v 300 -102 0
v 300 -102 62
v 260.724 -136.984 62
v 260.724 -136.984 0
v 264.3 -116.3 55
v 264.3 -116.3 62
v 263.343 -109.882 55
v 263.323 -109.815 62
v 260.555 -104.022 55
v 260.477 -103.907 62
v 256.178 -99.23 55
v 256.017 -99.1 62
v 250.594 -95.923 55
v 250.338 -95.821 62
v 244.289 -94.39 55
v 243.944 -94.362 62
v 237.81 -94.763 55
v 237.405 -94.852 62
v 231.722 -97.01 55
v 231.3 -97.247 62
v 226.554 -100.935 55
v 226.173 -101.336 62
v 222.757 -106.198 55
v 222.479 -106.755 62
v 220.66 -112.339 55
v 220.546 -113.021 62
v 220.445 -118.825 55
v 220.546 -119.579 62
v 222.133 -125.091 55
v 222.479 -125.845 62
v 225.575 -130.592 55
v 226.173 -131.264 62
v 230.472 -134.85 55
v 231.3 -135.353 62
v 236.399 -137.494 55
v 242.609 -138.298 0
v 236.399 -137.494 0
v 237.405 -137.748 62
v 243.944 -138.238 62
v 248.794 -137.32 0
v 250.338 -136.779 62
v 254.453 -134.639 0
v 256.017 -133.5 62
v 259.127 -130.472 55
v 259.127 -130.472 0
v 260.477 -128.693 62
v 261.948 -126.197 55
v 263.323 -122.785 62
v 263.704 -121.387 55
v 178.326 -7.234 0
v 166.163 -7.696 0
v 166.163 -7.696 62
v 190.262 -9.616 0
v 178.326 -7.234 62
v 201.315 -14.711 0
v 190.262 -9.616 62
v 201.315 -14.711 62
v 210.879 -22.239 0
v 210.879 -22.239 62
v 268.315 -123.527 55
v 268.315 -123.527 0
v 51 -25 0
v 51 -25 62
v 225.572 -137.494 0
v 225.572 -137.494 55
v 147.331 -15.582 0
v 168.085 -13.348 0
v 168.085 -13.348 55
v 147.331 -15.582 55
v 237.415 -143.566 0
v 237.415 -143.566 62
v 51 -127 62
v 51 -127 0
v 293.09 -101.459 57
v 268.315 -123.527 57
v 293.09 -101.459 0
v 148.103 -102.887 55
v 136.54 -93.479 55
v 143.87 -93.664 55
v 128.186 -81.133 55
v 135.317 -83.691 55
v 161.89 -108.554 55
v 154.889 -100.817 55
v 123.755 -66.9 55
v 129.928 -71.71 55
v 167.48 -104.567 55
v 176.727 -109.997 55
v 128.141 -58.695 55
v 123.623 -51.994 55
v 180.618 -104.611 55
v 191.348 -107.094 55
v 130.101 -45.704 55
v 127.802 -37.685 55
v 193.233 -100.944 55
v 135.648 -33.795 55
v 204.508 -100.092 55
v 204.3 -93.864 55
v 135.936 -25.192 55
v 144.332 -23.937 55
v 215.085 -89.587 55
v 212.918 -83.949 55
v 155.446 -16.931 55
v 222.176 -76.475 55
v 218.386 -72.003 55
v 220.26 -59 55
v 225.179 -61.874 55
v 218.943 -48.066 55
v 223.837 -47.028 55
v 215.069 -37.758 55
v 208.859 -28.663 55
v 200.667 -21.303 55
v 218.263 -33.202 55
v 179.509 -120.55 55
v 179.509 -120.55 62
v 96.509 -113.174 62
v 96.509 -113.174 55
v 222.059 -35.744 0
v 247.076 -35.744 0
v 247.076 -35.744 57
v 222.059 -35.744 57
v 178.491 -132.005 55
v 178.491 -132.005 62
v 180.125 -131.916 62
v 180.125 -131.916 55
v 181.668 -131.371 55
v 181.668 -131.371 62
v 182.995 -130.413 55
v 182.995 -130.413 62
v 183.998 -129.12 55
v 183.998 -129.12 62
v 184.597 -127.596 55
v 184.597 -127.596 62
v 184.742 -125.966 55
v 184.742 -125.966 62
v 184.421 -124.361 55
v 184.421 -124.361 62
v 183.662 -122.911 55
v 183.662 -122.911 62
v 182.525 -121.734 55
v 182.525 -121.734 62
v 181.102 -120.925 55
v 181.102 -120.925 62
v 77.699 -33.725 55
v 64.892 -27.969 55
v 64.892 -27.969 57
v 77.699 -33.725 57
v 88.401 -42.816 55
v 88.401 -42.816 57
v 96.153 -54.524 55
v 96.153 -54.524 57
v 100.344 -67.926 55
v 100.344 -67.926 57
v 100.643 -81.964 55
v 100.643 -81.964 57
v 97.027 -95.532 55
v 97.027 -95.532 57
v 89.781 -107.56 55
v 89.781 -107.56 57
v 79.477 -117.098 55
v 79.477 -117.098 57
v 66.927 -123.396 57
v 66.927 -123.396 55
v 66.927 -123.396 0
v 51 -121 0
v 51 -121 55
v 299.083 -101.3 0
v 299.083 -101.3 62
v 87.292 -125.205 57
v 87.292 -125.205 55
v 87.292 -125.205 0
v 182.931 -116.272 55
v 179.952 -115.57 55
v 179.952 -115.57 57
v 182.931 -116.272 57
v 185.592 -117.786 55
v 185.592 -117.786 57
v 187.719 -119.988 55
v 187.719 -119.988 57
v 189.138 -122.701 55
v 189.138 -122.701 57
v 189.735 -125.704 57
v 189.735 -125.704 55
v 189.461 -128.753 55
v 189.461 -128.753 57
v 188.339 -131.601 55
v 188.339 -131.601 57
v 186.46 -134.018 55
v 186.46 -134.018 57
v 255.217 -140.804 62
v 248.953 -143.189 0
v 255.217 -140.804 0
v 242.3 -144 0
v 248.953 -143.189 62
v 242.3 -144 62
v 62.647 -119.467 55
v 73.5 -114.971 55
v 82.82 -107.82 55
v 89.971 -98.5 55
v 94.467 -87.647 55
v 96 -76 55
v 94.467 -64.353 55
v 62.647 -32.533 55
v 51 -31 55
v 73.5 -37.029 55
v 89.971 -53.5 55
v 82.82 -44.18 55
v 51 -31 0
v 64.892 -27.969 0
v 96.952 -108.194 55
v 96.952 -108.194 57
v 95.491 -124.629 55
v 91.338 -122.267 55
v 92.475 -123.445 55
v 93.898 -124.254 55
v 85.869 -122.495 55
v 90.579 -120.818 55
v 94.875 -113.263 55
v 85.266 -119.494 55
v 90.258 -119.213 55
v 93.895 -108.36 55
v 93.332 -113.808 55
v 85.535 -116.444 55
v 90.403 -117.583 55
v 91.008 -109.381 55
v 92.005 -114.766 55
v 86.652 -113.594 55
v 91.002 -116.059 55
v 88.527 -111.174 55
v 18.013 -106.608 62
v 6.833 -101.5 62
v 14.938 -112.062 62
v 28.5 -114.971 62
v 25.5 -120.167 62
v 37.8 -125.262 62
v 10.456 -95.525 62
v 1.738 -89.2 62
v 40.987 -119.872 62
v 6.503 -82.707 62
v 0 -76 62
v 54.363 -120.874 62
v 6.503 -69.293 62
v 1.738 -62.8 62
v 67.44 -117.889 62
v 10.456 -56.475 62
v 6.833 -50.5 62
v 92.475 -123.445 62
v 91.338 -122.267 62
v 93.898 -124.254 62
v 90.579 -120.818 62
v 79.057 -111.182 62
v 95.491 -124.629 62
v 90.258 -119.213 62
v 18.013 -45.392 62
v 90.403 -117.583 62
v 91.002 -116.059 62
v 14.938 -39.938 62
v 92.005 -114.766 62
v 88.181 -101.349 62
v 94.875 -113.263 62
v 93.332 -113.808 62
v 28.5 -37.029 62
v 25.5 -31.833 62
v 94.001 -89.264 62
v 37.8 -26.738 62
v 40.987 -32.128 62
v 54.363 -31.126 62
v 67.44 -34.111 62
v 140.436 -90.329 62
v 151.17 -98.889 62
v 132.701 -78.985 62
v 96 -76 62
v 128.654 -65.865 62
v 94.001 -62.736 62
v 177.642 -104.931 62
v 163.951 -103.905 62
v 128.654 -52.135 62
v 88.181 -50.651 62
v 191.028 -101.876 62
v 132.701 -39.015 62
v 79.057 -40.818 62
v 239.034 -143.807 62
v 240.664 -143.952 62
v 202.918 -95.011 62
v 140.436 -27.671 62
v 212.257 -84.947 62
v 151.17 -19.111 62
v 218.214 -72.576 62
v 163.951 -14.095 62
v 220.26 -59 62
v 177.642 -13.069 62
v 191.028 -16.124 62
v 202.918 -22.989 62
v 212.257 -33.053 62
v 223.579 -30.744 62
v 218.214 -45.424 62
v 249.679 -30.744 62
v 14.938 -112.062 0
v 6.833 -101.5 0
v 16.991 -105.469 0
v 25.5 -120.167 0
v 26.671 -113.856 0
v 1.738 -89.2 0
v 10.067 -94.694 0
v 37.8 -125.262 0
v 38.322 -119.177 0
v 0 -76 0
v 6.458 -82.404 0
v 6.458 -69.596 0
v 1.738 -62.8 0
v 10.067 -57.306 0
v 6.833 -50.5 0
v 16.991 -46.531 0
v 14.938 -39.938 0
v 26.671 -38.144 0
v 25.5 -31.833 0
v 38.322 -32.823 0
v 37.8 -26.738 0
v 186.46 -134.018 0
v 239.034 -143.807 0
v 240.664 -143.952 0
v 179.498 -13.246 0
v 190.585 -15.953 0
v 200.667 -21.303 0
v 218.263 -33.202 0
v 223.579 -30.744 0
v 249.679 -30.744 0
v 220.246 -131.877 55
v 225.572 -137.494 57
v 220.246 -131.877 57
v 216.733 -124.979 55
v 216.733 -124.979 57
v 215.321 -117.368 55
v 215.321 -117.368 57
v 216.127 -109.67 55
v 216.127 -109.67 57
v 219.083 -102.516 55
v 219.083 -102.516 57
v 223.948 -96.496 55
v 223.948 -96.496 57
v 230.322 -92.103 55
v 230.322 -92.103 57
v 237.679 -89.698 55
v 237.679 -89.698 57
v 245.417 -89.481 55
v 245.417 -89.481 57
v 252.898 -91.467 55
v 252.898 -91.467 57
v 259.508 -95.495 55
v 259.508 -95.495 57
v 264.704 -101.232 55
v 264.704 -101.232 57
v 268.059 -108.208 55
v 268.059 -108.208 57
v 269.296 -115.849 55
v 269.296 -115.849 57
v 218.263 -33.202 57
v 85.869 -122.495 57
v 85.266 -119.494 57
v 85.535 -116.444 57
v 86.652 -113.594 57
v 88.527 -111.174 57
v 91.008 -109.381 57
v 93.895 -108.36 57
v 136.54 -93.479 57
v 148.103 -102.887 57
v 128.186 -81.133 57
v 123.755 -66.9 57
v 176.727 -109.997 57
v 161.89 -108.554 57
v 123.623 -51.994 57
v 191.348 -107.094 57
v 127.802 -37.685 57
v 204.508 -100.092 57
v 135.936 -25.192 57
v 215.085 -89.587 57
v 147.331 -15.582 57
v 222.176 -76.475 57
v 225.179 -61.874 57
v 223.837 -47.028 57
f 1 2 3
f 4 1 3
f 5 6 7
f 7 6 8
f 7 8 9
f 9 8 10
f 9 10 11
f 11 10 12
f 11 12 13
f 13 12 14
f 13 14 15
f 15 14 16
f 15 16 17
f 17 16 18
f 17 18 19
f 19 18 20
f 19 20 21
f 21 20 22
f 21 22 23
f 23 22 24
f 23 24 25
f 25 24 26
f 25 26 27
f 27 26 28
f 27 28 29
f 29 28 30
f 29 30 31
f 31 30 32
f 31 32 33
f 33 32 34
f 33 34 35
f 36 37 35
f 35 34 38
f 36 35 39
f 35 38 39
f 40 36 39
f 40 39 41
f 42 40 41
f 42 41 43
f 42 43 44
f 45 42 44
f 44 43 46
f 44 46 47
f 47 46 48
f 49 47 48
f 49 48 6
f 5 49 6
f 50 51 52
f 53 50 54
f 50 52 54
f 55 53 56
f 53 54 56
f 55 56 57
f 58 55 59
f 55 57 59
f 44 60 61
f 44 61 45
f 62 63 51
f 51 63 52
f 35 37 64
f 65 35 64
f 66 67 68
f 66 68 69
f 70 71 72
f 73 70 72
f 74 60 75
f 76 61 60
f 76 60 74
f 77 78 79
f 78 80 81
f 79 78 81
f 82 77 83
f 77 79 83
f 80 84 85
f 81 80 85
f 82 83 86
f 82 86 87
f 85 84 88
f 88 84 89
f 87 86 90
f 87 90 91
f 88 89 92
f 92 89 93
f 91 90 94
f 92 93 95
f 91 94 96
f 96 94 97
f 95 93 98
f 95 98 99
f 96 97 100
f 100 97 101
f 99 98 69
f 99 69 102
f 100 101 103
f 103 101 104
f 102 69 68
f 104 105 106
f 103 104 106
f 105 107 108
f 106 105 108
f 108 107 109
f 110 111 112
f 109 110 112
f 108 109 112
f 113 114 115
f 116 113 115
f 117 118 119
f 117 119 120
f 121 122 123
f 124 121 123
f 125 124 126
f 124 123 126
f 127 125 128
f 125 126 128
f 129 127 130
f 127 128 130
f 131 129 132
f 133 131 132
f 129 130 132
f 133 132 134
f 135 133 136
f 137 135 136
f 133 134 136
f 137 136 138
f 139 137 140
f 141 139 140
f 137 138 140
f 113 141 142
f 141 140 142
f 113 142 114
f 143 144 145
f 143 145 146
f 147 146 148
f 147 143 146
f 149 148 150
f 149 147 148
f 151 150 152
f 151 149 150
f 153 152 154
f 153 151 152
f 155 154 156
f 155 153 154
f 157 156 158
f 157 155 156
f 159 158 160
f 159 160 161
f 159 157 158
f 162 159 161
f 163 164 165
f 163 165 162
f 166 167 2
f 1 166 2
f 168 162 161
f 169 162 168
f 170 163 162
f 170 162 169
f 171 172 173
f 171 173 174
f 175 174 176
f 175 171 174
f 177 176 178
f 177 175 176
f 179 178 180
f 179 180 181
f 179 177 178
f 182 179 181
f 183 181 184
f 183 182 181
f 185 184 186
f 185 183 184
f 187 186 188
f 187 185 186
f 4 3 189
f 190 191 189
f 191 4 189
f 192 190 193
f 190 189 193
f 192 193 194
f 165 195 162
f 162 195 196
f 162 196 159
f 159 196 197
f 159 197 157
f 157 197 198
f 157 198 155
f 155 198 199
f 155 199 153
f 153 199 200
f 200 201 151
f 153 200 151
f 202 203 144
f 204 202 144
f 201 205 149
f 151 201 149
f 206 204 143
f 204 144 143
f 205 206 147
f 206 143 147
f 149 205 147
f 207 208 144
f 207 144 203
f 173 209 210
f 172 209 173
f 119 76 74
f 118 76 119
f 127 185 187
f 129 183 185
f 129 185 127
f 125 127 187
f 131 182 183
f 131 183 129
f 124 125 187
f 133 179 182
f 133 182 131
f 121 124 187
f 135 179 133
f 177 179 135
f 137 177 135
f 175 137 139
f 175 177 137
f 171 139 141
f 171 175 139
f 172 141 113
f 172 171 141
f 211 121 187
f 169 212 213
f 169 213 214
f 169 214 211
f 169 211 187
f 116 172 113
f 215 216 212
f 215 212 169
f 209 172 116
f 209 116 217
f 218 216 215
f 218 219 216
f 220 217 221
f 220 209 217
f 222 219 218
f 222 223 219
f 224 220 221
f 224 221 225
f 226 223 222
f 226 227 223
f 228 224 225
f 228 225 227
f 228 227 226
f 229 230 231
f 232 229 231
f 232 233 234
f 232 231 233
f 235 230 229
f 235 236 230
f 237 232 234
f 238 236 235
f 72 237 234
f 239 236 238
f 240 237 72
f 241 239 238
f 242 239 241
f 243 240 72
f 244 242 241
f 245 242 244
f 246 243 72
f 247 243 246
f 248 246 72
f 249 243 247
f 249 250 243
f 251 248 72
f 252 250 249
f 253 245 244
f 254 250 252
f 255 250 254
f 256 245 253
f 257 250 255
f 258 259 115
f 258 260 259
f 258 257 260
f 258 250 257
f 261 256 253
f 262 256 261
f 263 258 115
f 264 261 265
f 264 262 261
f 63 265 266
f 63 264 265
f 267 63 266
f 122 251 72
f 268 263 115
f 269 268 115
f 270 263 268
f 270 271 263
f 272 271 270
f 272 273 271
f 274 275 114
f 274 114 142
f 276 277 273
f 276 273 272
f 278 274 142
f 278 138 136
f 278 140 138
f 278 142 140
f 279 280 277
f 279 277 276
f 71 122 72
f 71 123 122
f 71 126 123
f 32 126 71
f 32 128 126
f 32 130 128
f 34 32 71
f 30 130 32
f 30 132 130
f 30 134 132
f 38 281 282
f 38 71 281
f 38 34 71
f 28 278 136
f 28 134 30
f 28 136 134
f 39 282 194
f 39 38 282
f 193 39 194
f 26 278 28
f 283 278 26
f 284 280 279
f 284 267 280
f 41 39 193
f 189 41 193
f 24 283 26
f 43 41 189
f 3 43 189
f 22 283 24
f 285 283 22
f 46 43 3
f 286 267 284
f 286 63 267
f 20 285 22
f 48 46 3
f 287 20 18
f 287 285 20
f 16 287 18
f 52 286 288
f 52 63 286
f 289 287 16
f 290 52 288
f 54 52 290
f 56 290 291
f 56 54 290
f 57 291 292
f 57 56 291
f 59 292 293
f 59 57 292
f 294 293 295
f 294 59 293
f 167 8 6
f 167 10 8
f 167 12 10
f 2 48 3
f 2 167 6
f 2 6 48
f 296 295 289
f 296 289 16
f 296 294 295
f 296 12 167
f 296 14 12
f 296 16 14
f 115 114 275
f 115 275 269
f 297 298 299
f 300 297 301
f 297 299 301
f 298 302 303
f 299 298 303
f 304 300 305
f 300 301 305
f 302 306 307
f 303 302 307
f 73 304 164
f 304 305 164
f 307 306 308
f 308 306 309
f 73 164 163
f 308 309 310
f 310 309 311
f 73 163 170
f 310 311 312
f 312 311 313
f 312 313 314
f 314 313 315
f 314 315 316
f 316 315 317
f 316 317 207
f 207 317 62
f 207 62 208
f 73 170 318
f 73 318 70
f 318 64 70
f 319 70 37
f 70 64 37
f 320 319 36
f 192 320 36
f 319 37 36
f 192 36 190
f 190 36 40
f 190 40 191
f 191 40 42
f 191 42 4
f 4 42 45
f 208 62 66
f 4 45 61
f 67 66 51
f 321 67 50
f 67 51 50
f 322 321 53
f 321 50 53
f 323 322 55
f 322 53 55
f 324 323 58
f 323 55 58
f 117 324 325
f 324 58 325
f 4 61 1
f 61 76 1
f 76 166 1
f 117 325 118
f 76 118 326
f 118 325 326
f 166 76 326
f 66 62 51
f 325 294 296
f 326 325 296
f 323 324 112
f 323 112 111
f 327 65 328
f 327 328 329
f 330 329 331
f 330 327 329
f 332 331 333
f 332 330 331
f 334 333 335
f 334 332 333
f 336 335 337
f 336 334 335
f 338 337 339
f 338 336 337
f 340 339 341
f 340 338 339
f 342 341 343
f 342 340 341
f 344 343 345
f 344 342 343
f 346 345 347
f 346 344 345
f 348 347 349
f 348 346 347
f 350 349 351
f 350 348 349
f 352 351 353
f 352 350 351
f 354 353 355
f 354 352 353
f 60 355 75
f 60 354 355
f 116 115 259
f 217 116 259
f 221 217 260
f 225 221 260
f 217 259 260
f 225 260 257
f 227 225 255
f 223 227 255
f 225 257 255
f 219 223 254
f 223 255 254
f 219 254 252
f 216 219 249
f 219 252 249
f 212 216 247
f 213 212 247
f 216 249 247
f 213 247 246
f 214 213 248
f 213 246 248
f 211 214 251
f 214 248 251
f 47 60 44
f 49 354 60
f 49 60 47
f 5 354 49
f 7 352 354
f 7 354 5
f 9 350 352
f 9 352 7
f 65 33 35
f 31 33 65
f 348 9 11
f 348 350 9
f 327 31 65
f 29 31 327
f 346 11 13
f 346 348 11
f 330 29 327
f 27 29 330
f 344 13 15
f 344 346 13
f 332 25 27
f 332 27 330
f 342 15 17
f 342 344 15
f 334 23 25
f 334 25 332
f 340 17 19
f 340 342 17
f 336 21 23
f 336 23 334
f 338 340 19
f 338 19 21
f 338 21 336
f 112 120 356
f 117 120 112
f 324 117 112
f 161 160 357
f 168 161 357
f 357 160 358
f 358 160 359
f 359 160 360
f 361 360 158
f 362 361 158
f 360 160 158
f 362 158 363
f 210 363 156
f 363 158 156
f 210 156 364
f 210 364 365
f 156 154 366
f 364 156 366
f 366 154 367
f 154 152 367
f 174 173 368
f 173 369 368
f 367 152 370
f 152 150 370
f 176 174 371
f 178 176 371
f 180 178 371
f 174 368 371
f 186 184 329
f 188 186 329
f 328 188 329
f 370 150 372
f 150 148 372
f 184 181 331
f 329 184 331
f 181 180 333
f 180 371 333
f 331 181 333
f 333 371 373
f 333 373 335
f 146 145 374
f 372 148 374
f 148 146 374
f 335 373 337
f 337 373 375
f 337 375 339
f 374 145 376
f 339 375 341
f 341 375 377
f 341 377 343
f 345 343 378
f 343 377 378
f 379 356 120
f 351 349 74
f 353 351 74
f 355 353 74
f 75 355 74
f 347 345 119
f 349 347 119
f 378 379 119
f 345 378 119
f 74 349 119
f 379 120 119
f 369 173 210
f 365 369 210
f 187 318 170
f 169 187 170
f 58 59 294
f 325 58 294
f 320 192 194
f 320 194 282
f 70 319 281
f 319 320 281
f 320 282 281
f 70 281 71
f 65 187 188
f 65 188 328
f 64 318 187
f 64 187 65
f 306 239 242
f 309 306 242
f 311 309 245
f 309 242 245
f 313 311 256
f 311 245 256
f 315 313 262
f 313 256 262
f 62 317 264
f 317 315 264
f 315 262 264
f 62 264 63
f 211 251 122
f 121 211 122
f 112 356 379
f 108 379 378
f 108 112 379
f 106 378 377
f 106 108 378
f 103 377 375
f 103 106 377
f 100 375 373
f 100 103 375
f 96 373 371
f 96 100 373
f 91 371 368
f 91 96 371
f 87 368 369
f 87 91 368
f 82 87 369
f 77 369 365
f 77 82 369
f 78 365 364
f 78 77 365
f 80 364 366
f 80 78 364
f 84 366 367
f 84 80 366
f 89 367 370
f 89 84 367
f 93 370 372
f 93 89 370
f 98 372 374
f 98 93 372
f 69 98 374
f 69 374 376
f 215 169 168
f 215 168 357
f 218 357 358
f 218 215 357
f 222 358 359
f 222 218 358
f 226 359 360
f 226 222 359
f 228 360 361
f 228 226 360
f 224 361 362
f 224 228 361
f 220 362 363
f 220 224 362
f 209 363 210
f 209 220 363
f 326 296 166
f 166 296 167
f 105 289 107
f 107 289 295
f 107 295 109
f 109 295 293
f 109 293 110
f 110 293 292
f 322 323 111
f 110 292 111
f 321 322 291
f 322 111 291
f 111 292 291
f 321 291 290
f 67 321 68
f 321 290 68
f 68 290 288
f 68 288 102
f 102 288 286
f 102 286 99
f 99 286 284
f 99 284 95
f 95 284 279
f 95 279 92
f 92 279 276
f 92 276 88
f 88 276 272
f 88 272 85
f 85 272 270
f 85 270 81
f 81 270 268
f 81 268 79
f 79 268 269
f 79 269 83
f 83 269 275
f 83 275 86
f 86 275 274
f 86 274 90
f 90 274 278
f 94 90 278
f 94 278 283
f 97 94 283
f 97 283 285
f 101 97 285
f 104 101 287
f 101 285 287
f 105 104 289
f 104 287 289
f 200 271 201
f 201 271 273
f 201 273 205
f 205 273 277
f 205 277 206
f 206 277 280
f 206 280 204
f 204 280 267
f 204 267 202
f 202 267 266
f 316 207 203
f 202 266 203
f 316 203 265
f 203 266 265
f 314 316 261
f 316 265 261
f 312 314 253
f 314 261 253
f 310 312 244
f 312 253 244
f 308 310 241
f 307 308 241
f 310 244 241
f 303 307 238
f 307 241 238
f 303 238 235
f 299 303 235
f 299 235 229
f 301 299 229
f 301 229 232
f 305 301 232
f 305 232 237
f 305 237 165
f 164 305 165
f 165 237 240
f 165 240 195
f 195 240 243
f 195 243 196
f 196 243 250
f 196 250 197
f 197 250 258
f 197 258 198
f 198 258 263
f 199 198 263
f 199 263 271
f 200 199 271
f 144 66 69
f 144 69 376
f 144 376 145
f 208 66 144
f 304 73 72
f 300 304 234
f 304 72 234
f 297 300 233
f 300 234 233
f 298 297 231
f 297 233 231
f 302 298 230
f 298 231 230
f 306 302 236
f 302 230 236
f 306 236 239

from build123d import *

# Parameters (mm, degrees)
SKETCH1_W           = 300
SKETCH1_H           = 152
BOSS_EXTRUDE1_DEPTH = 62
CUT_EXTRUDE2_DEPTH  = 342.976607387
SKETCH7_R           = 45
SKETCH7_R_2         = 46.06
SKETCH7_R_3         = 22
CUT_EXTRUDE4_DEPTH  = 339.496676498
CUT_EXTRUDE6_DEPTH  = 339.496676498
CUT_EXTRUDE9_DEPTH  = 339.496676498
SHELL2_DEPTH        = 57
CUT_EXTRUDE10_DEPTH = 55


# Read off the part's stored shape, not the designer's step: Shell2
with BuildPart() as part:
    # Sketch1 → Boss-Extrude1 (new body)
    with BuildSketch(Plane.XY):
        with Locations((150, -76)):
            Rectangle(SKETCH1_W, SKETCH1_H)
    extrude(amount=BOSS_EXTRUDE1_DEPTH)

    # Sketch2 → Cut-Extrude2 (cut, through all)
    with BuildSketch(Plane.XY.offset(62)):
        with BuildLine():
            ThreePointArc((51, -127), (14.937554126, -112.062445807), (0, -75.999999905))
            Line((0, -75.999999905), (0, -152))
            Line((0, -152), (300, -152))
            Line((300, -152), (300, -102))
            Line((300, -102), (260.724181003, -136.984282786))
            ThreePointArc((260.724181003, -136.984282786), (252.157366961, -142.186720854), (242.3, -144))
            ThreePointArc((242.3, -144), (239.848083808, -143.891268673), (237.415416722, -143.565928303))
            Line((237.415416722, -143.565928303), (51, -127))
        make_face()
        with BuildLine():
            ThreePointArc((0, -75.999999905), (14.937554193, -39.937554126), (51, -25))
            Line((51, -25), (166.163471247, -7.695622939))
            ThreePointArc((166.163471247, -7.695622939), (190.26153232, -9.61627718), (210.878909402, -22.238845161))
            Line((210.878909402, -22.238845161), (251.946068796, -20.152501272))
            Line((251.946068796, -20.152501272), (300, -102))
            Line((300, -102), (300, 0))
            Line((300, 0), (0, 0))
            Line((0, 0), (0, -75.999999905))
        make_face()
    extrude(amount=-CUT_EXTRUDE2_DEPTH, mode=Mode.SUBTRACT)

    # Sketch7 → Cut-Extrude4 (cut, through all)
    with BuildSketch(Plane.XY.offset(62)):
        with Locations((51, -76)):
            Circle(SKETCH7_R)
        with Locations((174.2, -59)):
            Circle(SKETCH7_R_2)
        with Locations((242.3, -116.3)):
            Circle(SKETCH7_R_3)
    extrude(amount=-CUT_EXTRUDE4_DEPTH, mode=Mode.SUBTRACT)

    # Sketch6 → Cut-Extrude6 (cut, through all)
    with BuildSketch(Plane.XY.offset(62)):
        with BuildLine():
            Line((95.491028227, -124.62889745), (178.491028227, -132.004746901))
            ThreePointArc((178.491028227, -132.004746901), (184.727429418, -126.786289256), (179.508971773, -120.549888066))
            Line((179.508971773, -120.549888066), (96.508971773, -113.174038615))
            ThreePointArc((96.508971773, -113.174038615), (90.272570582, -118.39249626), (95.491028227, -124.62889745))
        make_face()
    extrude(amount=-CUT_EXTRUDE6_DEPTH, mode=Mode.SUBTRACT)

    # Sketch10 → Cut-Extrude9 (cut, through all)
    with BuildSketch(Plane.XY.offset(62)):
        Polygon((210.878909402, -22.238845161), (223.578909402, -30.744161401), (249.678909402, -30.744161401), (299.082639453, -101.3), (300, -102), (251.946068796, -20.152501272), align=None)
    extrude(amount=-CUT_EXTRUDE9_DEPTH, mode=Mode.SUBTRACT)

    # Shell2 outline → Shell2 (cut)
    with BuildSketch(Plane.XY):
        with BuildLine():
            ThreePointArc((179.951555923, -115.569514659), (189.137709243, -122.70109723), (186.459518175, -134.017995012))
            Line((186.459518175, -134.017995012), (225.572036413, -137.493754604))
            ThreePointArc((225.572036413, -137.493754604), (233.913861687, -90.635380692), (268.314757677, -123.52719745))
            Line((268.314757677, -123.52719745), (293.090088132, -101.458983754))
            Line((293.090088132, -101.458983754), (247.076074149, -35.744161401))
            Line((247.076074149, -35.744161401), (222.05928739, -35.744161401))
            Line((222.05928739, -35.744161401), (218.263483983, -33.202074129))
            ThreePointArc((218.263483983, -33.202074129), (161.890244674, -108.553945593), (147.330636825, -15.581560109))
            Line((147.330636825, -15.581560109), (64.89221906, -27.968695108))
            ThreePointArc((64.89221906, -27.968695108), (100.988642148, -74.934328279), (66.926556679, -123.39561997))
            Line((66.926556679, -123.39561997), (87.292394522, -125.205443511))
            ThreePointArc((87.292394522, -125.205443511), (86.651779504, -113.593617849), (96.951555923, -108.193665208))
            Line((96.951555923, -108.193665208), (179.951555923, -115.569514659))
        make_face()
    extrude(amount=SHELL2_DEPTH, mode=Mode.SUBTRACT)

    # Sketch12 → Cut-Extrude10 (cut)
    with BuildSketch(Plane(origin=(0, 0, 0), x_dir=(-1, 0, 0), z_dir=(0, 0, -1))):
        with BuildLine():
            Line((-64.89221906, -27.968695108), (-51, -31))
            ThreePointArc((-51, -31), (-96, -76), (-51, -121))
            Line((-51, -121), (-66.926556679, -123.39561997))
            ThreePointArc((-66.926556679, -123.39561997), (-100.988642148, -74.934328279), (-64.89221906, -27.968695108))
        make_face()
        with BuildLine():
            Line((-268.314757677, -123.52719745), (-259.127186744, -130.472007137))
            ThreePointArc((-259.127186744, -130.472007137), (-235.806137419, -95.280253361), (-236.398748795, -137.493754604))
            Line((-236.398748795, -137.493754604), (-225.572036413, -137.493754604))
            ThreePointArc((-225.572036413, -137.493754604), (-233.913861687, -90.635380692), (-268.314757677, -123.52719745))
        make_face()
        with BuildLine():
            Line((-186.459518175, -134.017995012), (-87.292394522, -125.205443511))
            ThreePointArc((-87.292394522, -125.205443511), (-86.651779504, -113.593617849), (-96.951555923, -108.193665208))
            Line((-96.951555923, -108.193665208), (-179.951555923, -115.569514659))
            ThreePointArc((-179.951555923, -115.569514659), (-189.137709243, -122.70109723), (-186.459518175, -134.017995012))
        make_face()
        with BuildLine():
            Line((-218.263483983, -33.202074129), (-200.666763454, -21.30339495))
            ThreePointArc((-200.666763454, -21.30339495), (-163.274286328, -103.745417428), (-168.084950709, -13.347729825))
            Line((-168.084950709, -13.347729825), (-147.330636825, -15.581560109))
            ThreePointArc((-147.330636825, -15.581560109), (-161.890244675, -108.553945593), (-218.263483983, -33.202074129))
        make_face()
    extrude(amount=-CUT_EXTRUDE10_DEPTH, mode=Mode.SUBTRACT)


solid = part.part
